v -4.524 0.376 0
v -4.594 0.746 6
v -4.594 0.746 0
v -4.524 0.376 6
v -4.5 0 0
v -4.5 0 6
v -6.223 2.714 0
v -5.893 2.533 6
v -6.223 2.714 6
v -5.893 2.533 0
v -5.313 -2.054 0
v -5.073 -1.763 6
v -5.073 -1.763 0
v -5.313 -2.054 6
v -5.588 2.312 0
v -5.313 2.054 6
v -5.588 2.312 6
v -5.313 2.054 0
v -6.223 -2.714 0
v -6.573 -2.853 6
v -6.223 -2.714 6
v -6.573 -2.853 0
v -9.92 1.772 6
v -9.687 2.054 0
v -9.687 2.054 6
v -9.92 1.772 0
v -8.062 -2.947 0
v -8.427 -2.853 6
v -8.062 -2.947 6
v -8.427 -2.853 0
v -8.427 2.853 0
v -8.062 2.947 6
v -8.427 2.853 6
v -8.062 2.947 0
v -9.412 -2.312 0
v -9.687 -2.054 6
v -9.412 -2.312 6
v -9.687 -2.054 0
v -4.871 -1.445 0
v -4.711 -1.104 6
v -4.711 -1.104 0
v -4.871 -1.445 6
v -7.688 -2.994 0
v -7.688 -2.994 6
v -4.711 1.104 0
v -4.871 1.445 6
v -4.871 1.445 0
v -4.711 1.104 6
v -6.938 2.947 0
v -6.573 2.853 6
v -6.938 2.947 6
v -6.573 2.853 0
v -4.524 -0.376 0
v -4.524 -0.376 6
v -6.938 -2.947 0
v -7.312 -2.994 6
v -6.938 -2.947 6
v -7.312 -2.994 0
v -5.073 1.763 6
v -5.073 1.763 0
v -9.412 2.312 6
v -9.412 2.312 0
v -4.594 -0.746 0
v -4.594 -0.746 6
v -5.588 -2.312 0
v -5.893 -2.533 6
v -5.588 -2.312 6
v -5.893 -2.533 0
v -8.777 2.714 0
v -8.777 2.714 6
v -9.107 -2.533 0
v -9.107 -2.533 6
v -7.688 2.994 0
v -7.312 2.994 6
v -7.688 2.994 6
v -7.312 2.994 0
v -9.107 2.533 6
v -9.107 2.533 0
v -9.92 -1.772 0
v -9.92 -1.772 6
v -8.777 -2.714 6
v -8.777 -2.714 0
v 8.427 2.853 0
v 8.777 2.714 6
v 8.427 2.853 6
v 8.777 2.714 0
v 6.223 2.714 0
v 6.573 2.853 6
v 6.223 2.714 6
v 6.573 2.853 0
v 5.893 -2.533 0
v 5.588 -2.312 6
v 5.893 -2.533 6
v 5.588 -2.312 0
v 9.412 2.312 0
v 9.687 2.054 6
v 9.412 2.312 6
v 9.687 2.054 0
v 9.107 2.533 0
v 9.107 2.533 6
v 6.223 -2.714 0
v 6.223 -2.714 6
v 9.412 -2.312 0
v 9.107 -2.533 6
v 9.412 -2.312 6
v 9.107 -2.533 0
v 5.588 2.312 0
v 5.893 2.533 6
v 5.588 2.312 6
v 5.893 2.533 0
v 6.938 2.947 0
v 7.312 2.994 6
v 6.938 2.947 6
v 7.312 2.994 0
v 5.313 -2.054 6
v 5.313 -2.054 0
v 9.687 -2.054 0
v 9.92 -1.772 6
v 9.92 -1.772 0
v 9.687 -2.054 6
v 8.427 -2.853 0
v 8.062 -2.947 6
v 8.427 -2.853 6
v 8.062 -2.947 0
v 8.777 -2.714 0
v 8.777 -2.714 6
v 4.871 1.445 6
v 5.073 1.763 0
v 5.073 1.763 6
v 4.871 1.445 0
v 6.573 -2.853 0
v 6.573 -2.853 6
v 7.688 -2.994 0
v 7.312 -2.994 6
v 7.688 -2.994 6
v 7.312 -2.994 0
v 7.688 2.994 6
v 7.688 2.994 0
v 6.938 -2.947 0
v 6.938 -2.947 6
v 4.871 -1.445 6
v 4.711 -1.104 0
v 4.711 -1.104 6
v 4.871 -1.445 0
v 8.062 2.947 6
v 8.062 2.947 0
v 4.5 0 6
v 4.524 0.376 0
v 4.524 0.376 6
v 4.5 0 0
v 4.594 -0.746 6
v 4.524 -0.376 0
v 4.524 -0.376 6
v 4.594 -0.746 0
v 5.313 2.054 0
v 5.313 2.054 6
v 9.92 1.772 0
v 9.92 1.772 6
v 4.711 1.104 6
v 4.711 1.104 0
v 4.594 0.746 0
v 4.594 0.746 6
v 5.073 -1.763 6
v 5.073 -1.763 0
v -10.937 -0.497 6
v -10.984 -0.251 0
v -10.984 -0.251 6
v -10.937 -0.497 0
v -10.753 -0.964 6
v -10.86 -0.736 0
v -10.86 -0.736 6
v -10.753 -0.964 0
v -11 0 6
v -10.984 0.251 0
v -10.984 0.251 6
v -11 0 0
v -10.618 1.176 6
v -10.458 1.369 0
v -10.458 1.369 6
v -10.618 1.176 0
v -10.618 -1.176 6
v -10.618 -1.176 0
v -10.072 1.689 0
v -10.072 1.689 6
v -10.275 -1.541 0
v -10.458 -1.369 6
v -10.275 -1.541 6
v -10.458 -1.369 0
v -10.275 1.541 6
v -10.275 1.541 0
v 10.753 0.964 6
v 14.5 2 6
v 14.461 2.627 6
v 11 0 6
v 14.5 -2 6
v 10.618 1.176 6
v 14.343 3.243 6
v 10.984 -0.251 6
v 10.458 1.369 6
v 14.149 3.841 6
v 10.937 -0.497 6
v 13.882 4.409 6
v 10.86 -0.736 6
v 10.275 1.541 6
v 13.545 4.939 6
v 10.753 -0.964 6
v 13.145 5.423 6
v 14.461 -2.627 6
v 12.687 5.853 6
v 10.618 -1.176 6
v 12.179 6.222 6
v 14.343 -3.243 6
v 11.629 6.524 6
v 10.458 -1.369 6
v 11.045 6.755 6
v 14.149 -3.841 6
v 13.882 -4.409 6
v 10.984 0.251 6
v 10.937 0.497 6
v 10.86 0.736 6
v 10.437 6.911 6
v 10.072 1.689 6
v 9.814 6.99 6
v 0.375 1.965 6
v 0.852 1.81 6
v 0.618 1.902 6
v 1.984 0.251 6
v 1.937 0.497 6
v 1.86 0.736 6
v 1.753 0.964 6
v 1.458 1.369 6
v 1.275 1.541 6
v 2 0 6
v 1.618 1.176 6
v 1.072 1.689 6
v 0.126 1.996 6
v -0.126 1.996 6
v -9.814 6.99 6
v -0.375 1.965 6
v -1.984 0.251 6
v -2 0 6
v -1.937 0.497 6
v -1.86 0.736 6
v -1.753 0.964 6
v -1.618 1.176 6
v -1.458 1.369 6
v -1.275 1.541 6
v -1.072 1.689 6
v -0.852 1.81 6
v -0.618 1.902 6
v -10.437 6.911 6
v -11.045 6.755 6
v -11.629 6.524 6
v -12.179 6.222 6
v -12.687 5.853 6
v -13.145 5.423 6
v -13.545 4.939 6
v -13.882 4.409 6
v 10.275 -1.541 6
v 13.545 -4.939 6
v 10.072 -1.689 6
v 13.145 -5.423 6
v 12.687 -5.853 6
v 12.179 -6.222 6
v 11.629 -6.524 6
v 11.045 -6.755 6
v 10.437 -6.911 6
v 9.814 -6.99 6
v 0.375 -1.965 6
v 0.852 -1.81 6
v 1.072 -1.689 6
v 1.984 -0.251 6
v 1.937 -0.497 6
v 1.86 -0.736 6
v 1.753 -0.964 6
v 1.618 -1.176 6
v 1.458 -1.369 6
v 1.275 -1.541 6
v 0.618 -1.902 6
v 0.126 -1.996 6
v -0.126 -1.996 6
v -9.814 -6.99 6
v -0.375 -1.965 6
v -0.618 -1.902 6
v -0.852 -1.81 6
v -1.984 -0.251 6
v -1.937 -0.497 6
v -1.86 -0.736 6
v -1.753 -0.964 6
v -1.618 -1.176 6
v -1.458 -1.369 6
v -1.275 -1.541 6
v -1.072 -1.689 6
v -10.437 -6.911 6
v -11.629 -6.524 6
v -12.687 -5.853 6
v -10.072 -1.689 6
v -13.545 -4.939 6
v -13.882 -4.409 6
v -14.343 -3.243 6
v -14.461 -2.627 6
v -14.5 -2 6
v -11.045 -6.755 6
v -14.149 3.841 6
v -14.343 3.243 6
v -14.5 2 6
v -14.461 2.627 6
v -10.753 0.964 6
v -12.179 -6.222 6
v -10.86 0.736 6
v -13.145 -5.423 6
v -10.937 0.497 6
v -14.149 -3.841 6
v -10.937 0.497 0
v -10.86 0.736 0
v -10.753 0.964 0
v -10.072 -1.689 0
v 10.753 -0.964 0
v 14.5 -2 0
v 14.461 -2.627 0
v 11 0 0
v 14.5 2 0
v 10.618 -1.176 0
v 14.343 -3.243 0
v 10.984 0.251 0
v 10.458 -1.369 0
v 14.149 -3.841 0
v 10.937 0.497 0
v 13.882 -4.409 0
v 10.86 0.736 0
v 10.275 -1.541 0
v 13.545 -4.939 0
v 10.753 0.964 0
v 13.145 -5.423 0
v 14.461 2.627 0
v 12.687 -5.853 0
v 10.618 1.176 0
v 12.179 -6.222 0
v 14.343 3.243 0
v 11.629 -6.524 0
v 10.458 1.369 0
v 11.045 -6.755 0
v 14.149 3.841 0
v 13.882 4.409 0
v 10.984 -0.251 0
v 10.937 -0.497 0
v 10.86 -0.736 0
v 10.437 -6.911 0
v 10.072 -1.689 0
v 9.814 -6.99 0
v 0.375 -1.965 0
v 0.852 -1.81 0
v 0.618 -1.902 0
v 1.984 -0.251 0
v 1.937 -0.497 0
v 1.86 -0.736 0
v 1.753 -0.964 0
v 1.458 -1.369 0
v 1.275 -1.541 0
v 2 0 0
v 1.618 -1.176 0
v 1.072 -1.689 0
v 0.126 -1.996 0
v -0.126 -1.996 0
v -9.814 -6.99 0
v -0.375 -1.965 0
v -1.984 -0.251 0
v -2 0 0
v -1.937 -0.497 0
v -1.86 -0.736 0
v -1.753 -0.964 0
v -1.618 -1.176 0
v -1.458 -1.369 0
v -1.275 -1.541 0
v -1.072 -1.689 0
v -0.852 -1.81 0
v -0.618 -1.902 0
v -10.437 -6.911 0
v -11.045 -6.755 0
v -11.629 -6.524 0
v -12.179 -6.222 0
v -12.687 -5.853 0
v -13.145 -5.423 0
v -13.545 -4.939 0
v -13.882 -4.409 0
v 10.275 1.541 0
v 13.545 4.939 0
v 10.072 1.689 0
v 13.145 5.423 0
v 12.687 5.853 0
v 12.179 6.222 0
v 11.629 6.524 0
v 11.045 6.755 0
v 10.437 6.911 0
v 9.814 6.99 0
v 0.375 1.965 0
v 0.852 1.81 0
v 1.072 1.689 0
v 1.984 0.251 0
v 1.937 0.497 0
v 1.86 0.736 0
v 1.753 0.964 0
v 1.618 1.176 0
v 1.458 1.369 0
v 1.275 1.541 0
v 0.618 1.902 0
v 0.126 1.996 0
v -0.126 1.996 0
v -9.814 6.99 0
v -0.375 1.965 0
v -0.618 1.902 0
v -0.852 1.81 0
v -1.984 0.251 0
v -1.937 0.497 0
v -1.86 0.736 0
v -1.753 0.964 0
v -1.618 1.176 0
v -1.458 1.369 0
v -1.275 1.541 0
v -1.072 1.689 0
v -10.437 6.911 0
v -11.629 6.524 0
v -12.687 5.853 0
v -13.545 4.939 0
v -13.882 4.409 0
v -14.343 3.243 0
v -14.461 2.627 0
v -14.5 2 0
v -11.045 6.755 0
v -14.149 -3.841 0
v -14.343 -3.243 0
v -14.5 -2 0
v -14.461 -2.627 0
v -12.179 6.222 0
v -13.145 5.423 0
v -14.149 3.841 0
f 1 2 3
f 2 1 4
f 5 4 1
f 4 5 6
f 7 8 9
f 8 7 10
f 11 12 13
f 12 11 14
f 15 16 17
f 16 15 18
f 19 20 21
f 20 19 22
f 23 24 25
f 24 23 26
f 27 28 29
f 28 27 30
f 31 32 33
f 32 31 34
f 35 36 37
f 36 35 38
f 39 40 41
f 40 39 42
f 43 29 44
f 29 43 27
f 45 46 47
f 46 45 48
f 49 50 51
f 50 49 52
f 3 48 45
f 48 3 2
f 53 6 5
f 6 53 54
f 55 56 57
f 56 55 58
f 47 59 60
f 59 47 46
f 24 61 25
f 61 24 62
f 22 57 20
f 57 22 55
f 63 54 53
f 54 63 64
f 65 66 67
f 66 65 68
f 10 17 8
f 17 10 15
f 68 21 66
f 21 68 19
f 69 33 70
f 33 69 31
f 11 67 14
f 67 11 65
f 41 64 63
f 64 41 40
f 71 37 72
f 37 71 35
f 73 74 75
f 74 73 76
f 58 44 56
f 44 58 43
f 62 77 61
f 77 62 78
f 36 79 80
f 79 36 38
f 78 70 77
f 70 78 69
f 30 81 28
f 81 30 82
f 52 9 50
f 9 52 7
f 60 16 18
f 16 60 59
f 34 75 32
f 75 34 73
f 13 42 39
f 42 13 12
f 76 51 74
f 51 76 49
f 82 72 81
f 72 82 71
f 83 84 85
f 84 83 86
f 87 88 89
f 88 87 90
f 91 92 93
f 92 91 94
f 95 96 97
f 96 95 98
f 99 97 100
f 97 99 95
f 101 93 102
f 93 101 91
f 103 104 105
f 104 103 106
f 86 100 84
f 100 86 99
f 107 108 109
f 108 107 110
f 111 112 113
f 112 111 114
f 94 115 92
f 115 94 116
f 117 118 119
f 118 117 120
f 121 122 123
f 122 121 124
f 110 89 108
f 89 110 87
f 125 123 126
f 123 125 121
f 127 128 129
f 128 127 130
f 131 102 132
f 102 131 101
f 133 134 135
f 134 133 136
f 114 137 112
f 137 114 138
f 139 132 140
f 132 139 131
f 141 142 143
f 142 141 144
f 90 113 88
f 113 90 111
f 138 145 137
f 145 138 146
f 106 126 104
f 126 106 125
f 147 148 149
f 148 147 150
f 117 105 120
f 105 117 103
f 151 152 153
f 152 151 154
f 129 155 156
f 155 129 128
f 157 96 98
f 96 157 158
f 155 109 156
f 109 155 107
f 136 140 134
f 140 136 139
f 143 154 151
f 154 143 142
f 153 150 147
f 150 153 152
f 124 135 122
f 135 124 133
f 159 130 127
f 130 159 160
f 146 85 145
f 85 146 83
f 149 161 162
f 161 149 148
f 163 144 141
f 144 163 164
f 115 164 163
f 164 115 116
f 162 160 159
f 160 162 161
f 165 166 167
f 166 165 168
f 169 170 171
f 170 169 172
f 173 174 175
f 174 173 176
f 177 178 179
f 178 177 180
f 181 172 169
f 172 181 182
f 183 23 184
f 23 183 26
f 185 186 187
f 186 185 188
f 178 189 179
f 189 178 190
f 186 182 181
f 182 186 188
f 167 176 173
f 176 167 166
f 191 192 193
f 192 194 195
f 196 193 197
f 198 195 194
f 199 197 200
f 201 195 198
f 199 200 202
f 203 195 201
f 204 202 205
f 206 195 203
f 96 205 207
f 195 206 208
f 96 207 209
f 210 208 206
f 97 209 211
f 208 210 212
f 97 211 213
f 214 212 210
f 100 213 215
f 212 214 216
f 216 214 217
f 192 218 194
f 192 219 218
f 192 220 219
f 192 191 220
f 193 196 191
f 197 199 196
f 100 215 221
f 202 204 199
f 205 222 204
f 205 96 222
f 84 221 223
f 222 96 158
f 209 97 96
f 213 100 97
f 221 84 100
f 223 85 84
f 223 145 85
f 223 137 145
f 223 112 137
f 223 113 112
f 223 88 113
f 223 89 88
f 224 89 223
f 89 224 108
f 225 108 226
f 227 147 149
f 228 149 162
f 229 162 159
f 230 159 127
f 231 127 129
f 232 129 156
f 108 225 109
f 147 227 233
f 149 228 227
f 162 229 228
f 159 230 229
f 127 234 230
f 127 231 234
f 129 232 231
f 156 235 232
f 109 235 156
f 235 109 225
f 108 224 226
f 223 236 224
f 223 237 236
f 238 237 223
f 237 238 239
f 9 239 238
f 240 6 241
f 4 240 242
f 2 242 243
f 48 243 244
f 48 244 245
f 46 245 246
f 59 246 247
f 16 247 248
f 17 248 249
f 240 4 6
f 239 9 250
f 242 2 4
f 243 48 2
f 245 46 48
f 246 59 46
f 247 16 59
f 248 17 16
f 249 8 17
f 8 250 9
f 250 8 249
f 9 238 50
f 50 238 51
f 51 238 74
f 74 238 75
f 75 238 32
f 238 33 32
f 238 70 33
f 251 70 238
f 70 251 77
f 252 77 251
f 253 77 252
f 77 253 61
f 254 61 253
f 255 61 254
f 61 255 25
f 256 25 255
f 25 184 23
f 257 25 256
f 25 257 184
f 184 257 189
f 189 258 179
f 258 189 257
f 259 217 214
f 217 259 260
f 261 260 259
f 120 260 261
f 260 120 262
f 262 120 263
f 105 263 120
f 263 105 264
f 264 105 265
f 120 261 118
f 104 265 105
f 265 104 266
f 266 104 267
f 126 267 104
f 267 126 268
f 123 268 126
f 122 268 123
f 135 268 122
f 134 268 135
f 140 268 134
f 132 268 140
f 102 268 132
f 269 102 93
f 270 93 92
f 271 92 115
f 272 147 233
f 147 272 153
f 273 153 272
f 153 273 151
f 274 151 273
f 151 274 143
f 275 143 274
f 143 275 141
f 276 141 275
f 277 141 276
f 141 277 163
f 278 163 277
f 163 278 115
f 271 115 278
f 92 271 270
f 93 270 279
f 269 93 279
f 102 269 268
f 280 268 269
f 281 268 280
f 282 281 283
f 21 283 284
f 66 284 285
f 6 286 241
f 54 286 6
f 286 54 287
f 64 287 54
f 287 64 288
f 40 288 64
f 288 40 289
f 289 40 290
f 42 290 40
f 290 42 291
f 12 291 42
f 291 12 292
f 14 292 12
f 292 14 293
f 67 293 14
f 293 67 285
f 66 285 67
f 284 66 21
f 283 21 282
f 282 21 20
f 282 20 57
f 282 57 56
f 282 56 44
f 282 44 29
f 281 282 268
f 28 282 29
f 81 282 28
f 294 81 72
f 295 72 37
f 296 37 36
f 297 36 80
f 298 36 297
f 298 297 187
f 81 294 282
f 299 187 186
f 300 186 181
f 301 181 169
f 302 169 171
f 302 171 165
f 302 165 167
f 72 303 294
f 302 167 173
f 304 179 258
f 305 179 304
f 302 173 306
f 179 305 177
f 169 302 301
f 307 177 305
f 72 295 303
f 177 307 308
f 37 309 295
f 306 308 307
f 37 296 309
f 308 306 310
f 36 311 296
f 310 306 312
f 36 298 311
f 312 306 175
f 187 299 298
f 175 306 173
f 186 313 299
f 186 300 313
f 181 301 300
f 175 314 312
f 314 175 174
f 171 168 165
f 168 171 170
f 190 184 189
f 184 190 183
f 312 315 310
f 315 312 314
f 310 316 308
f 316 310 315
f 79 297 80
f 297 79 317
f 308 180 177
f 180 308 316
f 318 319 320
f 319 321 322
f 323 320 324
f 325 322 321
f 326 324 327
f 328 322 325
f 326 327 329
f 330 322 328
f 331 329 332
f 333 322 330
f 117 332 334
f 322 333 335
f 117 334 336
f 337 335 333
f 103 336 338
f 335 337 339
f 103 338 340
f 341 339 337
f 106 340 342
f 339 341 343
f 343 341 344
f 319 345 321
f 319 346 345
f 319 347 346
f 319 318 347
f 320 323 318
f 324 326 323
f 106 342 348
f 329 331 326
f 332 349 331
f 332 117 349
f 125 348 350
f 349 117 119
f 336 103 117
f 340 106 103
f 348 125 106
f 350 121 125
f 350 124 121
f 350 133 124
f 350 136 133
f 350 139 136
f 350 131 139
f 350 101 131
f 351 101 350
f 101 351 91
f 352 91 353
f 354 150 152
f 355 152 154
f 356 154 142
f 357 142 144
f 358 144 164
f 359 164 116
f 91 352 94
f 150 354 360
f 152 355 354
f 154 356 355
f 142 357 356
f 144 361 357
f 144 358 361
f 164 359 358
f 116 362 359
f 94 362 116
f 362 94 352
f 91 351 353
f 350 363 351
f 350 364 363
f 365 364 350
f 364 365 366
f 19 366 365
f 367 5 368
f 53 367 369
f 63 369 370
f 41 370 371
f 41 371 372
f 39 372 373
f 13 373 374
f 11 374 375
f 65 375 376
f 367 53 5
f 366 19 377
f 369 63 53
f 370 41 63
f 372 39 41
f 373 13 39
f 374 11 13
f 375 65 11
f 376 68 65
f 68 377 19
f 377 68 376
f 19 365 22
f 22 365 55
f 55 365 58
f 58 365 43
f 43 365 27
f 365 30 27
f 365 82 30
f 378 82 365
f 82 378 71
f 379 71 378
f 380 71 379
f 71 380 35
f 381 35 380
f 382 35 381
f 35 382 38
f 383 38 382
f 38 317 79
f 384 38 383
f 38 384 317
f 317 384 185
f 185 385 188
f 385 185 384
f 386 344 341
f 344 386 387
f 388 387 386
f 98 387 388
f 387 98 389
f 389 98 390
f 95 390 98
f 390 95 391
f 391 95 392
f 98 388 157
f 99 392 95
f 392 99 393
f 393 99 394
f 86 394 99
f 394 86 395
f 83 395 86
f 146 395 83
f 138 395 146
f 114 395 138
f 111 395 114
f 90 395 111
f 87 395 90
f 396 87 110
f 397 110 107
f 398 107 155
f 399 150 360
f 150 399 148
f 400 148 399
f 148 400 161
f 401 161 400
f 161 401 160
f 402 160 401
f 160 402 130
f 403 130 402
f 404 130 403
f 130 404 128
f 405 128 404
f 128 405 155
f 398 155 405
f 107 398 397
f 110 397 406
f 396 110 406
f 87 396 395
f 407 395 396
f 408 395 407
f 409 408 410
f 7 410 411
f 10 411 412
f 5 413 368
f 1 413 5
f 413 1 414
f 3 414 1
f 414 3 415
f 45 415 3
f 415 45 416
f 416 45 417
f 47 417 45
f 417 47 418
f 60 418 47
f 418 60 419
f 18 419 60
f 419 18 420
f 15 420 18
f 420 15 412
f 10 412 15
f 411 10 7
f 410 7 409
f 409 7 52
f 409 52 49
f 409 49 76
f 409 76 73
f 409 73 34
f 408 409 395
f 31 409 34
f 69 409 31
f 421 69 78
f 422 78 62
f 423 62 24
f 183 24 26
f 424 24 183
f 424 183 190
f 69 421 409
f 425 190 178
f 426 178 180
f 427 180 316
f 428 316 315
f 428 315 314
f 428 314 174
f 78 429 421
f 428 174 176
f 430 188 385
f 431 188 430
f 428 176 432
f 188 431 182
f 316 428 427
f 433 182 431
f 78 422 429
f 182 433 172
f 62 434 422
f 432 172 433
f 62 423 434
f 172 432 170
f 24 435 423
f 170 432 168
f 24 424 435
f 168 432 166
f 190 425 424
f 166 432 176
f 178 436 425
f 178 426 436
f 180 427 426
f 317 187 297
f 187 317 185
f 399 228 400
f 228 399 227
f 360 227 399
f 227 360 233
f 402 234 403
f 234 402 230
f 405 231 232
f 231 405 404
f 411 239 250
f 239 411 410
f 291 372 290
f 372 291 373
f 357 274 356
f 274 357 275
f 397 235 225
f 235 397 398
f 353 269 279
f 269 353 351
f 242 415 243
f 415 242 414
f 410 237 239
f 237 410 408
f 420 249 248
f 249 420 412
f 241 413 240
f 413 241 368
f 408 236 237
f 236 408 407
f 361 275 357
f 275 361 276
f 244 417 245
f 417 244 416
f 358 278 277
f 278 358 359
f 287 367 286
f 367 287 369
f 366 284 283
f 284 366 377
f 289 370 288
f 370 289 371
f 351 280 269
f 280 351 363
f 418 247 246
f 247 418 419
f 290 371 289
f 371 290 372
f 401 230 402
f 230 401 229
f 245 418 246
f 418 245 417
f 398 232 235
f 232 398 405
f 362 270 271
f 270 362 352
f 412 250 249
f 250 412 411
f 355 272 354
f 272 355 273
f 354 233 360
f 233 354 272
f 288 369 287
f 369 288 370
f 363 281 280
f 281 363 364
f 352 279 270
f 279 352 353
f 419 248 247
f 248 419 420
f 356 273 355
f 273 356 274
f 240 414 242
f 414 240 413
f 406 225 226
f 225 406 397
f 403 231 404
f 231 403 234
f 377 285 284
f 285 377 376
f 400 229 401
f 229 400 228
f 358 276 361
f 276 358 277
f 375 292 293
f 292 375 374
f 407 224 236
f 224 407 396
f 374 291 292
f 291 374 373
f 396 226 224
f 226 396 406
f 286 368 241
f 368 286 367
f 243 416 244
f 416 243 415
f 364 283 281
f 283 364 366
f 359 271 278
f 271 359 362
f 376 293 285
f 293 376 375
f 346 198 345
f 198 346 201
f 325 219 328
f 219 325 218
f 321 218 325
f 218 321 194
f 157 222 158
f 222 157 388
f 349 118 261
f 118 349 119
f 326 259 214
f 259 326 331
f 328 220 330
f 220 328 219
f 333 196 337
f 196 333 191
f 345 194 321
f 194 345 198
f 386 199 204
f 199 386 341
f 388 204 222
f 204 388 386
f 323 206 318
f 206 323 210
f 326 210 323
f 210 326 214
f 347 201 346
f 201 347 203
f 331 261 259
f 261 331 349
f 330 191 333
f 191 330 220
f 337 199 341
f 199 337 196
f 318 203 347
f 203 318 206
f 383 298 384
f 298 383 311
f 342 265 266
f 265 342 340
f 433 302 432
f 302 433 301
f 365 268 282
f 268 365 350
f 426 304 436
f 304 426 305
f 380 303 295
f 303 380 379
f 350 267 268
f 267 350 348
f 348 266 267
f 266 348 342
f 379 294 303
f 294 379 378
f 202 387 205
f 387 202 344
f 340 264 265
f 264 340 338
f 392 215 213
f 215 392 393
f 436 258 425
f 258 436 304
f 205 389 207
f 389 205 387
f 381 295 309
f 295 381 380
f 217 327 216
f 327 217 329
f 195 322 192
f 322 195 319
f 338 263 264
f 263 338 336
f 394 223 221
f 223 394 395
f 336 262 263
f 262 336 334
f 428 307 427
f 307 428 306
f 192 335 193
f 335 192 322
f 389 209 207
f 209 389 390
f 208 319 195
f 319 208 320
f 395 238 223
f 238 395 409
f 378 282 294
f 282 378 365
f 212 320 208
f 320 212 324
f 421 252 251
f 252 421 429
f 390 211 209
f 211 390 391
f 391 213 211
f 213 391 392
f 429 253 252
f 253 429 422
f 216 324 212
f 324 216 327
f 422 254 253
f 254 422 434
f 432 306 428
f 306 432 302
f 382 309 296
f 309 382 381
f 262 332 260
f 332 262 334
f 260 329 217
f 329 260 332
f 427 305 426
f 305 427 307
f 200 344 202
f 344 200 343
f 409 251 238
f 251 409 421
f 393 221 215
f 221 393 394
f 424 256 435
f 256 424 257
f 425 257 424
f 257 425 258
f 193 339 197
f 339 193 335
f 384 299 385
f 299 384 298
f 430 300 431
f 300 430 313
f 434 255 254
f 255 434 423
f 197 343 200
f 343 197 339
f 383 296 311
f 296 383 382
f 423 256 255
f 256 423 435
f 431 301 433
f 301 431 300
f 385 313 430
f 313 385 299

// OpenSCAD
$fn = 50;


difference() {
	union() {
		hull() {
			translate(v = [-9.5000000000, 2.0000000000, 0]) {
				cylinder(h = 6, r = 5);
			}
			translate(v = [9.5000000000, 2.0000000000, 0]) {
				cylinder(h = 6, r = 5);
			}
			translate(v = [-9.5000000000, -2.0000000000, 0]) {
				cylinder(h = 6, r = 5);
			}
			translate(v = [9.5000000000, -2.0000000000, 0]) {
				cylinder(h = 6, r = 5);
			}
		}
	}
	union() {
		#translate(v = [-7.5000000000, 0.0000000000, -100.0000000000]) {
			cylinder(h = 200, r = 3.0000000000);
		}
		#translate(v = [-7.5000000000, 0.0000000000, -100.0000000000]) {
			cylinder(h = 200, r = 3.0000000000);
		}
		#translate(v = [7.5000000000, 0.0000000000, -100.0000000000]) {
			cylinder(h = 200, r = 3.0000000000);
		}
		#translate(v = [7.5000000000, 0.0000000000, -100.0000000000]) {
			cylinder(h = 200, r = 3.0000000000);
		}
		#translate(v = [-9.0000000000, 0, 0]) {
			cylinder(h = 6, r = 2.0000000000);
		}
		#cylinder(h = 6, r = 2.0000000000);
		#translate(v = [9.0000000000, 0, 0]) {
			cylinder(h = 6, r = 2.0000000000);
		}
	}
}
